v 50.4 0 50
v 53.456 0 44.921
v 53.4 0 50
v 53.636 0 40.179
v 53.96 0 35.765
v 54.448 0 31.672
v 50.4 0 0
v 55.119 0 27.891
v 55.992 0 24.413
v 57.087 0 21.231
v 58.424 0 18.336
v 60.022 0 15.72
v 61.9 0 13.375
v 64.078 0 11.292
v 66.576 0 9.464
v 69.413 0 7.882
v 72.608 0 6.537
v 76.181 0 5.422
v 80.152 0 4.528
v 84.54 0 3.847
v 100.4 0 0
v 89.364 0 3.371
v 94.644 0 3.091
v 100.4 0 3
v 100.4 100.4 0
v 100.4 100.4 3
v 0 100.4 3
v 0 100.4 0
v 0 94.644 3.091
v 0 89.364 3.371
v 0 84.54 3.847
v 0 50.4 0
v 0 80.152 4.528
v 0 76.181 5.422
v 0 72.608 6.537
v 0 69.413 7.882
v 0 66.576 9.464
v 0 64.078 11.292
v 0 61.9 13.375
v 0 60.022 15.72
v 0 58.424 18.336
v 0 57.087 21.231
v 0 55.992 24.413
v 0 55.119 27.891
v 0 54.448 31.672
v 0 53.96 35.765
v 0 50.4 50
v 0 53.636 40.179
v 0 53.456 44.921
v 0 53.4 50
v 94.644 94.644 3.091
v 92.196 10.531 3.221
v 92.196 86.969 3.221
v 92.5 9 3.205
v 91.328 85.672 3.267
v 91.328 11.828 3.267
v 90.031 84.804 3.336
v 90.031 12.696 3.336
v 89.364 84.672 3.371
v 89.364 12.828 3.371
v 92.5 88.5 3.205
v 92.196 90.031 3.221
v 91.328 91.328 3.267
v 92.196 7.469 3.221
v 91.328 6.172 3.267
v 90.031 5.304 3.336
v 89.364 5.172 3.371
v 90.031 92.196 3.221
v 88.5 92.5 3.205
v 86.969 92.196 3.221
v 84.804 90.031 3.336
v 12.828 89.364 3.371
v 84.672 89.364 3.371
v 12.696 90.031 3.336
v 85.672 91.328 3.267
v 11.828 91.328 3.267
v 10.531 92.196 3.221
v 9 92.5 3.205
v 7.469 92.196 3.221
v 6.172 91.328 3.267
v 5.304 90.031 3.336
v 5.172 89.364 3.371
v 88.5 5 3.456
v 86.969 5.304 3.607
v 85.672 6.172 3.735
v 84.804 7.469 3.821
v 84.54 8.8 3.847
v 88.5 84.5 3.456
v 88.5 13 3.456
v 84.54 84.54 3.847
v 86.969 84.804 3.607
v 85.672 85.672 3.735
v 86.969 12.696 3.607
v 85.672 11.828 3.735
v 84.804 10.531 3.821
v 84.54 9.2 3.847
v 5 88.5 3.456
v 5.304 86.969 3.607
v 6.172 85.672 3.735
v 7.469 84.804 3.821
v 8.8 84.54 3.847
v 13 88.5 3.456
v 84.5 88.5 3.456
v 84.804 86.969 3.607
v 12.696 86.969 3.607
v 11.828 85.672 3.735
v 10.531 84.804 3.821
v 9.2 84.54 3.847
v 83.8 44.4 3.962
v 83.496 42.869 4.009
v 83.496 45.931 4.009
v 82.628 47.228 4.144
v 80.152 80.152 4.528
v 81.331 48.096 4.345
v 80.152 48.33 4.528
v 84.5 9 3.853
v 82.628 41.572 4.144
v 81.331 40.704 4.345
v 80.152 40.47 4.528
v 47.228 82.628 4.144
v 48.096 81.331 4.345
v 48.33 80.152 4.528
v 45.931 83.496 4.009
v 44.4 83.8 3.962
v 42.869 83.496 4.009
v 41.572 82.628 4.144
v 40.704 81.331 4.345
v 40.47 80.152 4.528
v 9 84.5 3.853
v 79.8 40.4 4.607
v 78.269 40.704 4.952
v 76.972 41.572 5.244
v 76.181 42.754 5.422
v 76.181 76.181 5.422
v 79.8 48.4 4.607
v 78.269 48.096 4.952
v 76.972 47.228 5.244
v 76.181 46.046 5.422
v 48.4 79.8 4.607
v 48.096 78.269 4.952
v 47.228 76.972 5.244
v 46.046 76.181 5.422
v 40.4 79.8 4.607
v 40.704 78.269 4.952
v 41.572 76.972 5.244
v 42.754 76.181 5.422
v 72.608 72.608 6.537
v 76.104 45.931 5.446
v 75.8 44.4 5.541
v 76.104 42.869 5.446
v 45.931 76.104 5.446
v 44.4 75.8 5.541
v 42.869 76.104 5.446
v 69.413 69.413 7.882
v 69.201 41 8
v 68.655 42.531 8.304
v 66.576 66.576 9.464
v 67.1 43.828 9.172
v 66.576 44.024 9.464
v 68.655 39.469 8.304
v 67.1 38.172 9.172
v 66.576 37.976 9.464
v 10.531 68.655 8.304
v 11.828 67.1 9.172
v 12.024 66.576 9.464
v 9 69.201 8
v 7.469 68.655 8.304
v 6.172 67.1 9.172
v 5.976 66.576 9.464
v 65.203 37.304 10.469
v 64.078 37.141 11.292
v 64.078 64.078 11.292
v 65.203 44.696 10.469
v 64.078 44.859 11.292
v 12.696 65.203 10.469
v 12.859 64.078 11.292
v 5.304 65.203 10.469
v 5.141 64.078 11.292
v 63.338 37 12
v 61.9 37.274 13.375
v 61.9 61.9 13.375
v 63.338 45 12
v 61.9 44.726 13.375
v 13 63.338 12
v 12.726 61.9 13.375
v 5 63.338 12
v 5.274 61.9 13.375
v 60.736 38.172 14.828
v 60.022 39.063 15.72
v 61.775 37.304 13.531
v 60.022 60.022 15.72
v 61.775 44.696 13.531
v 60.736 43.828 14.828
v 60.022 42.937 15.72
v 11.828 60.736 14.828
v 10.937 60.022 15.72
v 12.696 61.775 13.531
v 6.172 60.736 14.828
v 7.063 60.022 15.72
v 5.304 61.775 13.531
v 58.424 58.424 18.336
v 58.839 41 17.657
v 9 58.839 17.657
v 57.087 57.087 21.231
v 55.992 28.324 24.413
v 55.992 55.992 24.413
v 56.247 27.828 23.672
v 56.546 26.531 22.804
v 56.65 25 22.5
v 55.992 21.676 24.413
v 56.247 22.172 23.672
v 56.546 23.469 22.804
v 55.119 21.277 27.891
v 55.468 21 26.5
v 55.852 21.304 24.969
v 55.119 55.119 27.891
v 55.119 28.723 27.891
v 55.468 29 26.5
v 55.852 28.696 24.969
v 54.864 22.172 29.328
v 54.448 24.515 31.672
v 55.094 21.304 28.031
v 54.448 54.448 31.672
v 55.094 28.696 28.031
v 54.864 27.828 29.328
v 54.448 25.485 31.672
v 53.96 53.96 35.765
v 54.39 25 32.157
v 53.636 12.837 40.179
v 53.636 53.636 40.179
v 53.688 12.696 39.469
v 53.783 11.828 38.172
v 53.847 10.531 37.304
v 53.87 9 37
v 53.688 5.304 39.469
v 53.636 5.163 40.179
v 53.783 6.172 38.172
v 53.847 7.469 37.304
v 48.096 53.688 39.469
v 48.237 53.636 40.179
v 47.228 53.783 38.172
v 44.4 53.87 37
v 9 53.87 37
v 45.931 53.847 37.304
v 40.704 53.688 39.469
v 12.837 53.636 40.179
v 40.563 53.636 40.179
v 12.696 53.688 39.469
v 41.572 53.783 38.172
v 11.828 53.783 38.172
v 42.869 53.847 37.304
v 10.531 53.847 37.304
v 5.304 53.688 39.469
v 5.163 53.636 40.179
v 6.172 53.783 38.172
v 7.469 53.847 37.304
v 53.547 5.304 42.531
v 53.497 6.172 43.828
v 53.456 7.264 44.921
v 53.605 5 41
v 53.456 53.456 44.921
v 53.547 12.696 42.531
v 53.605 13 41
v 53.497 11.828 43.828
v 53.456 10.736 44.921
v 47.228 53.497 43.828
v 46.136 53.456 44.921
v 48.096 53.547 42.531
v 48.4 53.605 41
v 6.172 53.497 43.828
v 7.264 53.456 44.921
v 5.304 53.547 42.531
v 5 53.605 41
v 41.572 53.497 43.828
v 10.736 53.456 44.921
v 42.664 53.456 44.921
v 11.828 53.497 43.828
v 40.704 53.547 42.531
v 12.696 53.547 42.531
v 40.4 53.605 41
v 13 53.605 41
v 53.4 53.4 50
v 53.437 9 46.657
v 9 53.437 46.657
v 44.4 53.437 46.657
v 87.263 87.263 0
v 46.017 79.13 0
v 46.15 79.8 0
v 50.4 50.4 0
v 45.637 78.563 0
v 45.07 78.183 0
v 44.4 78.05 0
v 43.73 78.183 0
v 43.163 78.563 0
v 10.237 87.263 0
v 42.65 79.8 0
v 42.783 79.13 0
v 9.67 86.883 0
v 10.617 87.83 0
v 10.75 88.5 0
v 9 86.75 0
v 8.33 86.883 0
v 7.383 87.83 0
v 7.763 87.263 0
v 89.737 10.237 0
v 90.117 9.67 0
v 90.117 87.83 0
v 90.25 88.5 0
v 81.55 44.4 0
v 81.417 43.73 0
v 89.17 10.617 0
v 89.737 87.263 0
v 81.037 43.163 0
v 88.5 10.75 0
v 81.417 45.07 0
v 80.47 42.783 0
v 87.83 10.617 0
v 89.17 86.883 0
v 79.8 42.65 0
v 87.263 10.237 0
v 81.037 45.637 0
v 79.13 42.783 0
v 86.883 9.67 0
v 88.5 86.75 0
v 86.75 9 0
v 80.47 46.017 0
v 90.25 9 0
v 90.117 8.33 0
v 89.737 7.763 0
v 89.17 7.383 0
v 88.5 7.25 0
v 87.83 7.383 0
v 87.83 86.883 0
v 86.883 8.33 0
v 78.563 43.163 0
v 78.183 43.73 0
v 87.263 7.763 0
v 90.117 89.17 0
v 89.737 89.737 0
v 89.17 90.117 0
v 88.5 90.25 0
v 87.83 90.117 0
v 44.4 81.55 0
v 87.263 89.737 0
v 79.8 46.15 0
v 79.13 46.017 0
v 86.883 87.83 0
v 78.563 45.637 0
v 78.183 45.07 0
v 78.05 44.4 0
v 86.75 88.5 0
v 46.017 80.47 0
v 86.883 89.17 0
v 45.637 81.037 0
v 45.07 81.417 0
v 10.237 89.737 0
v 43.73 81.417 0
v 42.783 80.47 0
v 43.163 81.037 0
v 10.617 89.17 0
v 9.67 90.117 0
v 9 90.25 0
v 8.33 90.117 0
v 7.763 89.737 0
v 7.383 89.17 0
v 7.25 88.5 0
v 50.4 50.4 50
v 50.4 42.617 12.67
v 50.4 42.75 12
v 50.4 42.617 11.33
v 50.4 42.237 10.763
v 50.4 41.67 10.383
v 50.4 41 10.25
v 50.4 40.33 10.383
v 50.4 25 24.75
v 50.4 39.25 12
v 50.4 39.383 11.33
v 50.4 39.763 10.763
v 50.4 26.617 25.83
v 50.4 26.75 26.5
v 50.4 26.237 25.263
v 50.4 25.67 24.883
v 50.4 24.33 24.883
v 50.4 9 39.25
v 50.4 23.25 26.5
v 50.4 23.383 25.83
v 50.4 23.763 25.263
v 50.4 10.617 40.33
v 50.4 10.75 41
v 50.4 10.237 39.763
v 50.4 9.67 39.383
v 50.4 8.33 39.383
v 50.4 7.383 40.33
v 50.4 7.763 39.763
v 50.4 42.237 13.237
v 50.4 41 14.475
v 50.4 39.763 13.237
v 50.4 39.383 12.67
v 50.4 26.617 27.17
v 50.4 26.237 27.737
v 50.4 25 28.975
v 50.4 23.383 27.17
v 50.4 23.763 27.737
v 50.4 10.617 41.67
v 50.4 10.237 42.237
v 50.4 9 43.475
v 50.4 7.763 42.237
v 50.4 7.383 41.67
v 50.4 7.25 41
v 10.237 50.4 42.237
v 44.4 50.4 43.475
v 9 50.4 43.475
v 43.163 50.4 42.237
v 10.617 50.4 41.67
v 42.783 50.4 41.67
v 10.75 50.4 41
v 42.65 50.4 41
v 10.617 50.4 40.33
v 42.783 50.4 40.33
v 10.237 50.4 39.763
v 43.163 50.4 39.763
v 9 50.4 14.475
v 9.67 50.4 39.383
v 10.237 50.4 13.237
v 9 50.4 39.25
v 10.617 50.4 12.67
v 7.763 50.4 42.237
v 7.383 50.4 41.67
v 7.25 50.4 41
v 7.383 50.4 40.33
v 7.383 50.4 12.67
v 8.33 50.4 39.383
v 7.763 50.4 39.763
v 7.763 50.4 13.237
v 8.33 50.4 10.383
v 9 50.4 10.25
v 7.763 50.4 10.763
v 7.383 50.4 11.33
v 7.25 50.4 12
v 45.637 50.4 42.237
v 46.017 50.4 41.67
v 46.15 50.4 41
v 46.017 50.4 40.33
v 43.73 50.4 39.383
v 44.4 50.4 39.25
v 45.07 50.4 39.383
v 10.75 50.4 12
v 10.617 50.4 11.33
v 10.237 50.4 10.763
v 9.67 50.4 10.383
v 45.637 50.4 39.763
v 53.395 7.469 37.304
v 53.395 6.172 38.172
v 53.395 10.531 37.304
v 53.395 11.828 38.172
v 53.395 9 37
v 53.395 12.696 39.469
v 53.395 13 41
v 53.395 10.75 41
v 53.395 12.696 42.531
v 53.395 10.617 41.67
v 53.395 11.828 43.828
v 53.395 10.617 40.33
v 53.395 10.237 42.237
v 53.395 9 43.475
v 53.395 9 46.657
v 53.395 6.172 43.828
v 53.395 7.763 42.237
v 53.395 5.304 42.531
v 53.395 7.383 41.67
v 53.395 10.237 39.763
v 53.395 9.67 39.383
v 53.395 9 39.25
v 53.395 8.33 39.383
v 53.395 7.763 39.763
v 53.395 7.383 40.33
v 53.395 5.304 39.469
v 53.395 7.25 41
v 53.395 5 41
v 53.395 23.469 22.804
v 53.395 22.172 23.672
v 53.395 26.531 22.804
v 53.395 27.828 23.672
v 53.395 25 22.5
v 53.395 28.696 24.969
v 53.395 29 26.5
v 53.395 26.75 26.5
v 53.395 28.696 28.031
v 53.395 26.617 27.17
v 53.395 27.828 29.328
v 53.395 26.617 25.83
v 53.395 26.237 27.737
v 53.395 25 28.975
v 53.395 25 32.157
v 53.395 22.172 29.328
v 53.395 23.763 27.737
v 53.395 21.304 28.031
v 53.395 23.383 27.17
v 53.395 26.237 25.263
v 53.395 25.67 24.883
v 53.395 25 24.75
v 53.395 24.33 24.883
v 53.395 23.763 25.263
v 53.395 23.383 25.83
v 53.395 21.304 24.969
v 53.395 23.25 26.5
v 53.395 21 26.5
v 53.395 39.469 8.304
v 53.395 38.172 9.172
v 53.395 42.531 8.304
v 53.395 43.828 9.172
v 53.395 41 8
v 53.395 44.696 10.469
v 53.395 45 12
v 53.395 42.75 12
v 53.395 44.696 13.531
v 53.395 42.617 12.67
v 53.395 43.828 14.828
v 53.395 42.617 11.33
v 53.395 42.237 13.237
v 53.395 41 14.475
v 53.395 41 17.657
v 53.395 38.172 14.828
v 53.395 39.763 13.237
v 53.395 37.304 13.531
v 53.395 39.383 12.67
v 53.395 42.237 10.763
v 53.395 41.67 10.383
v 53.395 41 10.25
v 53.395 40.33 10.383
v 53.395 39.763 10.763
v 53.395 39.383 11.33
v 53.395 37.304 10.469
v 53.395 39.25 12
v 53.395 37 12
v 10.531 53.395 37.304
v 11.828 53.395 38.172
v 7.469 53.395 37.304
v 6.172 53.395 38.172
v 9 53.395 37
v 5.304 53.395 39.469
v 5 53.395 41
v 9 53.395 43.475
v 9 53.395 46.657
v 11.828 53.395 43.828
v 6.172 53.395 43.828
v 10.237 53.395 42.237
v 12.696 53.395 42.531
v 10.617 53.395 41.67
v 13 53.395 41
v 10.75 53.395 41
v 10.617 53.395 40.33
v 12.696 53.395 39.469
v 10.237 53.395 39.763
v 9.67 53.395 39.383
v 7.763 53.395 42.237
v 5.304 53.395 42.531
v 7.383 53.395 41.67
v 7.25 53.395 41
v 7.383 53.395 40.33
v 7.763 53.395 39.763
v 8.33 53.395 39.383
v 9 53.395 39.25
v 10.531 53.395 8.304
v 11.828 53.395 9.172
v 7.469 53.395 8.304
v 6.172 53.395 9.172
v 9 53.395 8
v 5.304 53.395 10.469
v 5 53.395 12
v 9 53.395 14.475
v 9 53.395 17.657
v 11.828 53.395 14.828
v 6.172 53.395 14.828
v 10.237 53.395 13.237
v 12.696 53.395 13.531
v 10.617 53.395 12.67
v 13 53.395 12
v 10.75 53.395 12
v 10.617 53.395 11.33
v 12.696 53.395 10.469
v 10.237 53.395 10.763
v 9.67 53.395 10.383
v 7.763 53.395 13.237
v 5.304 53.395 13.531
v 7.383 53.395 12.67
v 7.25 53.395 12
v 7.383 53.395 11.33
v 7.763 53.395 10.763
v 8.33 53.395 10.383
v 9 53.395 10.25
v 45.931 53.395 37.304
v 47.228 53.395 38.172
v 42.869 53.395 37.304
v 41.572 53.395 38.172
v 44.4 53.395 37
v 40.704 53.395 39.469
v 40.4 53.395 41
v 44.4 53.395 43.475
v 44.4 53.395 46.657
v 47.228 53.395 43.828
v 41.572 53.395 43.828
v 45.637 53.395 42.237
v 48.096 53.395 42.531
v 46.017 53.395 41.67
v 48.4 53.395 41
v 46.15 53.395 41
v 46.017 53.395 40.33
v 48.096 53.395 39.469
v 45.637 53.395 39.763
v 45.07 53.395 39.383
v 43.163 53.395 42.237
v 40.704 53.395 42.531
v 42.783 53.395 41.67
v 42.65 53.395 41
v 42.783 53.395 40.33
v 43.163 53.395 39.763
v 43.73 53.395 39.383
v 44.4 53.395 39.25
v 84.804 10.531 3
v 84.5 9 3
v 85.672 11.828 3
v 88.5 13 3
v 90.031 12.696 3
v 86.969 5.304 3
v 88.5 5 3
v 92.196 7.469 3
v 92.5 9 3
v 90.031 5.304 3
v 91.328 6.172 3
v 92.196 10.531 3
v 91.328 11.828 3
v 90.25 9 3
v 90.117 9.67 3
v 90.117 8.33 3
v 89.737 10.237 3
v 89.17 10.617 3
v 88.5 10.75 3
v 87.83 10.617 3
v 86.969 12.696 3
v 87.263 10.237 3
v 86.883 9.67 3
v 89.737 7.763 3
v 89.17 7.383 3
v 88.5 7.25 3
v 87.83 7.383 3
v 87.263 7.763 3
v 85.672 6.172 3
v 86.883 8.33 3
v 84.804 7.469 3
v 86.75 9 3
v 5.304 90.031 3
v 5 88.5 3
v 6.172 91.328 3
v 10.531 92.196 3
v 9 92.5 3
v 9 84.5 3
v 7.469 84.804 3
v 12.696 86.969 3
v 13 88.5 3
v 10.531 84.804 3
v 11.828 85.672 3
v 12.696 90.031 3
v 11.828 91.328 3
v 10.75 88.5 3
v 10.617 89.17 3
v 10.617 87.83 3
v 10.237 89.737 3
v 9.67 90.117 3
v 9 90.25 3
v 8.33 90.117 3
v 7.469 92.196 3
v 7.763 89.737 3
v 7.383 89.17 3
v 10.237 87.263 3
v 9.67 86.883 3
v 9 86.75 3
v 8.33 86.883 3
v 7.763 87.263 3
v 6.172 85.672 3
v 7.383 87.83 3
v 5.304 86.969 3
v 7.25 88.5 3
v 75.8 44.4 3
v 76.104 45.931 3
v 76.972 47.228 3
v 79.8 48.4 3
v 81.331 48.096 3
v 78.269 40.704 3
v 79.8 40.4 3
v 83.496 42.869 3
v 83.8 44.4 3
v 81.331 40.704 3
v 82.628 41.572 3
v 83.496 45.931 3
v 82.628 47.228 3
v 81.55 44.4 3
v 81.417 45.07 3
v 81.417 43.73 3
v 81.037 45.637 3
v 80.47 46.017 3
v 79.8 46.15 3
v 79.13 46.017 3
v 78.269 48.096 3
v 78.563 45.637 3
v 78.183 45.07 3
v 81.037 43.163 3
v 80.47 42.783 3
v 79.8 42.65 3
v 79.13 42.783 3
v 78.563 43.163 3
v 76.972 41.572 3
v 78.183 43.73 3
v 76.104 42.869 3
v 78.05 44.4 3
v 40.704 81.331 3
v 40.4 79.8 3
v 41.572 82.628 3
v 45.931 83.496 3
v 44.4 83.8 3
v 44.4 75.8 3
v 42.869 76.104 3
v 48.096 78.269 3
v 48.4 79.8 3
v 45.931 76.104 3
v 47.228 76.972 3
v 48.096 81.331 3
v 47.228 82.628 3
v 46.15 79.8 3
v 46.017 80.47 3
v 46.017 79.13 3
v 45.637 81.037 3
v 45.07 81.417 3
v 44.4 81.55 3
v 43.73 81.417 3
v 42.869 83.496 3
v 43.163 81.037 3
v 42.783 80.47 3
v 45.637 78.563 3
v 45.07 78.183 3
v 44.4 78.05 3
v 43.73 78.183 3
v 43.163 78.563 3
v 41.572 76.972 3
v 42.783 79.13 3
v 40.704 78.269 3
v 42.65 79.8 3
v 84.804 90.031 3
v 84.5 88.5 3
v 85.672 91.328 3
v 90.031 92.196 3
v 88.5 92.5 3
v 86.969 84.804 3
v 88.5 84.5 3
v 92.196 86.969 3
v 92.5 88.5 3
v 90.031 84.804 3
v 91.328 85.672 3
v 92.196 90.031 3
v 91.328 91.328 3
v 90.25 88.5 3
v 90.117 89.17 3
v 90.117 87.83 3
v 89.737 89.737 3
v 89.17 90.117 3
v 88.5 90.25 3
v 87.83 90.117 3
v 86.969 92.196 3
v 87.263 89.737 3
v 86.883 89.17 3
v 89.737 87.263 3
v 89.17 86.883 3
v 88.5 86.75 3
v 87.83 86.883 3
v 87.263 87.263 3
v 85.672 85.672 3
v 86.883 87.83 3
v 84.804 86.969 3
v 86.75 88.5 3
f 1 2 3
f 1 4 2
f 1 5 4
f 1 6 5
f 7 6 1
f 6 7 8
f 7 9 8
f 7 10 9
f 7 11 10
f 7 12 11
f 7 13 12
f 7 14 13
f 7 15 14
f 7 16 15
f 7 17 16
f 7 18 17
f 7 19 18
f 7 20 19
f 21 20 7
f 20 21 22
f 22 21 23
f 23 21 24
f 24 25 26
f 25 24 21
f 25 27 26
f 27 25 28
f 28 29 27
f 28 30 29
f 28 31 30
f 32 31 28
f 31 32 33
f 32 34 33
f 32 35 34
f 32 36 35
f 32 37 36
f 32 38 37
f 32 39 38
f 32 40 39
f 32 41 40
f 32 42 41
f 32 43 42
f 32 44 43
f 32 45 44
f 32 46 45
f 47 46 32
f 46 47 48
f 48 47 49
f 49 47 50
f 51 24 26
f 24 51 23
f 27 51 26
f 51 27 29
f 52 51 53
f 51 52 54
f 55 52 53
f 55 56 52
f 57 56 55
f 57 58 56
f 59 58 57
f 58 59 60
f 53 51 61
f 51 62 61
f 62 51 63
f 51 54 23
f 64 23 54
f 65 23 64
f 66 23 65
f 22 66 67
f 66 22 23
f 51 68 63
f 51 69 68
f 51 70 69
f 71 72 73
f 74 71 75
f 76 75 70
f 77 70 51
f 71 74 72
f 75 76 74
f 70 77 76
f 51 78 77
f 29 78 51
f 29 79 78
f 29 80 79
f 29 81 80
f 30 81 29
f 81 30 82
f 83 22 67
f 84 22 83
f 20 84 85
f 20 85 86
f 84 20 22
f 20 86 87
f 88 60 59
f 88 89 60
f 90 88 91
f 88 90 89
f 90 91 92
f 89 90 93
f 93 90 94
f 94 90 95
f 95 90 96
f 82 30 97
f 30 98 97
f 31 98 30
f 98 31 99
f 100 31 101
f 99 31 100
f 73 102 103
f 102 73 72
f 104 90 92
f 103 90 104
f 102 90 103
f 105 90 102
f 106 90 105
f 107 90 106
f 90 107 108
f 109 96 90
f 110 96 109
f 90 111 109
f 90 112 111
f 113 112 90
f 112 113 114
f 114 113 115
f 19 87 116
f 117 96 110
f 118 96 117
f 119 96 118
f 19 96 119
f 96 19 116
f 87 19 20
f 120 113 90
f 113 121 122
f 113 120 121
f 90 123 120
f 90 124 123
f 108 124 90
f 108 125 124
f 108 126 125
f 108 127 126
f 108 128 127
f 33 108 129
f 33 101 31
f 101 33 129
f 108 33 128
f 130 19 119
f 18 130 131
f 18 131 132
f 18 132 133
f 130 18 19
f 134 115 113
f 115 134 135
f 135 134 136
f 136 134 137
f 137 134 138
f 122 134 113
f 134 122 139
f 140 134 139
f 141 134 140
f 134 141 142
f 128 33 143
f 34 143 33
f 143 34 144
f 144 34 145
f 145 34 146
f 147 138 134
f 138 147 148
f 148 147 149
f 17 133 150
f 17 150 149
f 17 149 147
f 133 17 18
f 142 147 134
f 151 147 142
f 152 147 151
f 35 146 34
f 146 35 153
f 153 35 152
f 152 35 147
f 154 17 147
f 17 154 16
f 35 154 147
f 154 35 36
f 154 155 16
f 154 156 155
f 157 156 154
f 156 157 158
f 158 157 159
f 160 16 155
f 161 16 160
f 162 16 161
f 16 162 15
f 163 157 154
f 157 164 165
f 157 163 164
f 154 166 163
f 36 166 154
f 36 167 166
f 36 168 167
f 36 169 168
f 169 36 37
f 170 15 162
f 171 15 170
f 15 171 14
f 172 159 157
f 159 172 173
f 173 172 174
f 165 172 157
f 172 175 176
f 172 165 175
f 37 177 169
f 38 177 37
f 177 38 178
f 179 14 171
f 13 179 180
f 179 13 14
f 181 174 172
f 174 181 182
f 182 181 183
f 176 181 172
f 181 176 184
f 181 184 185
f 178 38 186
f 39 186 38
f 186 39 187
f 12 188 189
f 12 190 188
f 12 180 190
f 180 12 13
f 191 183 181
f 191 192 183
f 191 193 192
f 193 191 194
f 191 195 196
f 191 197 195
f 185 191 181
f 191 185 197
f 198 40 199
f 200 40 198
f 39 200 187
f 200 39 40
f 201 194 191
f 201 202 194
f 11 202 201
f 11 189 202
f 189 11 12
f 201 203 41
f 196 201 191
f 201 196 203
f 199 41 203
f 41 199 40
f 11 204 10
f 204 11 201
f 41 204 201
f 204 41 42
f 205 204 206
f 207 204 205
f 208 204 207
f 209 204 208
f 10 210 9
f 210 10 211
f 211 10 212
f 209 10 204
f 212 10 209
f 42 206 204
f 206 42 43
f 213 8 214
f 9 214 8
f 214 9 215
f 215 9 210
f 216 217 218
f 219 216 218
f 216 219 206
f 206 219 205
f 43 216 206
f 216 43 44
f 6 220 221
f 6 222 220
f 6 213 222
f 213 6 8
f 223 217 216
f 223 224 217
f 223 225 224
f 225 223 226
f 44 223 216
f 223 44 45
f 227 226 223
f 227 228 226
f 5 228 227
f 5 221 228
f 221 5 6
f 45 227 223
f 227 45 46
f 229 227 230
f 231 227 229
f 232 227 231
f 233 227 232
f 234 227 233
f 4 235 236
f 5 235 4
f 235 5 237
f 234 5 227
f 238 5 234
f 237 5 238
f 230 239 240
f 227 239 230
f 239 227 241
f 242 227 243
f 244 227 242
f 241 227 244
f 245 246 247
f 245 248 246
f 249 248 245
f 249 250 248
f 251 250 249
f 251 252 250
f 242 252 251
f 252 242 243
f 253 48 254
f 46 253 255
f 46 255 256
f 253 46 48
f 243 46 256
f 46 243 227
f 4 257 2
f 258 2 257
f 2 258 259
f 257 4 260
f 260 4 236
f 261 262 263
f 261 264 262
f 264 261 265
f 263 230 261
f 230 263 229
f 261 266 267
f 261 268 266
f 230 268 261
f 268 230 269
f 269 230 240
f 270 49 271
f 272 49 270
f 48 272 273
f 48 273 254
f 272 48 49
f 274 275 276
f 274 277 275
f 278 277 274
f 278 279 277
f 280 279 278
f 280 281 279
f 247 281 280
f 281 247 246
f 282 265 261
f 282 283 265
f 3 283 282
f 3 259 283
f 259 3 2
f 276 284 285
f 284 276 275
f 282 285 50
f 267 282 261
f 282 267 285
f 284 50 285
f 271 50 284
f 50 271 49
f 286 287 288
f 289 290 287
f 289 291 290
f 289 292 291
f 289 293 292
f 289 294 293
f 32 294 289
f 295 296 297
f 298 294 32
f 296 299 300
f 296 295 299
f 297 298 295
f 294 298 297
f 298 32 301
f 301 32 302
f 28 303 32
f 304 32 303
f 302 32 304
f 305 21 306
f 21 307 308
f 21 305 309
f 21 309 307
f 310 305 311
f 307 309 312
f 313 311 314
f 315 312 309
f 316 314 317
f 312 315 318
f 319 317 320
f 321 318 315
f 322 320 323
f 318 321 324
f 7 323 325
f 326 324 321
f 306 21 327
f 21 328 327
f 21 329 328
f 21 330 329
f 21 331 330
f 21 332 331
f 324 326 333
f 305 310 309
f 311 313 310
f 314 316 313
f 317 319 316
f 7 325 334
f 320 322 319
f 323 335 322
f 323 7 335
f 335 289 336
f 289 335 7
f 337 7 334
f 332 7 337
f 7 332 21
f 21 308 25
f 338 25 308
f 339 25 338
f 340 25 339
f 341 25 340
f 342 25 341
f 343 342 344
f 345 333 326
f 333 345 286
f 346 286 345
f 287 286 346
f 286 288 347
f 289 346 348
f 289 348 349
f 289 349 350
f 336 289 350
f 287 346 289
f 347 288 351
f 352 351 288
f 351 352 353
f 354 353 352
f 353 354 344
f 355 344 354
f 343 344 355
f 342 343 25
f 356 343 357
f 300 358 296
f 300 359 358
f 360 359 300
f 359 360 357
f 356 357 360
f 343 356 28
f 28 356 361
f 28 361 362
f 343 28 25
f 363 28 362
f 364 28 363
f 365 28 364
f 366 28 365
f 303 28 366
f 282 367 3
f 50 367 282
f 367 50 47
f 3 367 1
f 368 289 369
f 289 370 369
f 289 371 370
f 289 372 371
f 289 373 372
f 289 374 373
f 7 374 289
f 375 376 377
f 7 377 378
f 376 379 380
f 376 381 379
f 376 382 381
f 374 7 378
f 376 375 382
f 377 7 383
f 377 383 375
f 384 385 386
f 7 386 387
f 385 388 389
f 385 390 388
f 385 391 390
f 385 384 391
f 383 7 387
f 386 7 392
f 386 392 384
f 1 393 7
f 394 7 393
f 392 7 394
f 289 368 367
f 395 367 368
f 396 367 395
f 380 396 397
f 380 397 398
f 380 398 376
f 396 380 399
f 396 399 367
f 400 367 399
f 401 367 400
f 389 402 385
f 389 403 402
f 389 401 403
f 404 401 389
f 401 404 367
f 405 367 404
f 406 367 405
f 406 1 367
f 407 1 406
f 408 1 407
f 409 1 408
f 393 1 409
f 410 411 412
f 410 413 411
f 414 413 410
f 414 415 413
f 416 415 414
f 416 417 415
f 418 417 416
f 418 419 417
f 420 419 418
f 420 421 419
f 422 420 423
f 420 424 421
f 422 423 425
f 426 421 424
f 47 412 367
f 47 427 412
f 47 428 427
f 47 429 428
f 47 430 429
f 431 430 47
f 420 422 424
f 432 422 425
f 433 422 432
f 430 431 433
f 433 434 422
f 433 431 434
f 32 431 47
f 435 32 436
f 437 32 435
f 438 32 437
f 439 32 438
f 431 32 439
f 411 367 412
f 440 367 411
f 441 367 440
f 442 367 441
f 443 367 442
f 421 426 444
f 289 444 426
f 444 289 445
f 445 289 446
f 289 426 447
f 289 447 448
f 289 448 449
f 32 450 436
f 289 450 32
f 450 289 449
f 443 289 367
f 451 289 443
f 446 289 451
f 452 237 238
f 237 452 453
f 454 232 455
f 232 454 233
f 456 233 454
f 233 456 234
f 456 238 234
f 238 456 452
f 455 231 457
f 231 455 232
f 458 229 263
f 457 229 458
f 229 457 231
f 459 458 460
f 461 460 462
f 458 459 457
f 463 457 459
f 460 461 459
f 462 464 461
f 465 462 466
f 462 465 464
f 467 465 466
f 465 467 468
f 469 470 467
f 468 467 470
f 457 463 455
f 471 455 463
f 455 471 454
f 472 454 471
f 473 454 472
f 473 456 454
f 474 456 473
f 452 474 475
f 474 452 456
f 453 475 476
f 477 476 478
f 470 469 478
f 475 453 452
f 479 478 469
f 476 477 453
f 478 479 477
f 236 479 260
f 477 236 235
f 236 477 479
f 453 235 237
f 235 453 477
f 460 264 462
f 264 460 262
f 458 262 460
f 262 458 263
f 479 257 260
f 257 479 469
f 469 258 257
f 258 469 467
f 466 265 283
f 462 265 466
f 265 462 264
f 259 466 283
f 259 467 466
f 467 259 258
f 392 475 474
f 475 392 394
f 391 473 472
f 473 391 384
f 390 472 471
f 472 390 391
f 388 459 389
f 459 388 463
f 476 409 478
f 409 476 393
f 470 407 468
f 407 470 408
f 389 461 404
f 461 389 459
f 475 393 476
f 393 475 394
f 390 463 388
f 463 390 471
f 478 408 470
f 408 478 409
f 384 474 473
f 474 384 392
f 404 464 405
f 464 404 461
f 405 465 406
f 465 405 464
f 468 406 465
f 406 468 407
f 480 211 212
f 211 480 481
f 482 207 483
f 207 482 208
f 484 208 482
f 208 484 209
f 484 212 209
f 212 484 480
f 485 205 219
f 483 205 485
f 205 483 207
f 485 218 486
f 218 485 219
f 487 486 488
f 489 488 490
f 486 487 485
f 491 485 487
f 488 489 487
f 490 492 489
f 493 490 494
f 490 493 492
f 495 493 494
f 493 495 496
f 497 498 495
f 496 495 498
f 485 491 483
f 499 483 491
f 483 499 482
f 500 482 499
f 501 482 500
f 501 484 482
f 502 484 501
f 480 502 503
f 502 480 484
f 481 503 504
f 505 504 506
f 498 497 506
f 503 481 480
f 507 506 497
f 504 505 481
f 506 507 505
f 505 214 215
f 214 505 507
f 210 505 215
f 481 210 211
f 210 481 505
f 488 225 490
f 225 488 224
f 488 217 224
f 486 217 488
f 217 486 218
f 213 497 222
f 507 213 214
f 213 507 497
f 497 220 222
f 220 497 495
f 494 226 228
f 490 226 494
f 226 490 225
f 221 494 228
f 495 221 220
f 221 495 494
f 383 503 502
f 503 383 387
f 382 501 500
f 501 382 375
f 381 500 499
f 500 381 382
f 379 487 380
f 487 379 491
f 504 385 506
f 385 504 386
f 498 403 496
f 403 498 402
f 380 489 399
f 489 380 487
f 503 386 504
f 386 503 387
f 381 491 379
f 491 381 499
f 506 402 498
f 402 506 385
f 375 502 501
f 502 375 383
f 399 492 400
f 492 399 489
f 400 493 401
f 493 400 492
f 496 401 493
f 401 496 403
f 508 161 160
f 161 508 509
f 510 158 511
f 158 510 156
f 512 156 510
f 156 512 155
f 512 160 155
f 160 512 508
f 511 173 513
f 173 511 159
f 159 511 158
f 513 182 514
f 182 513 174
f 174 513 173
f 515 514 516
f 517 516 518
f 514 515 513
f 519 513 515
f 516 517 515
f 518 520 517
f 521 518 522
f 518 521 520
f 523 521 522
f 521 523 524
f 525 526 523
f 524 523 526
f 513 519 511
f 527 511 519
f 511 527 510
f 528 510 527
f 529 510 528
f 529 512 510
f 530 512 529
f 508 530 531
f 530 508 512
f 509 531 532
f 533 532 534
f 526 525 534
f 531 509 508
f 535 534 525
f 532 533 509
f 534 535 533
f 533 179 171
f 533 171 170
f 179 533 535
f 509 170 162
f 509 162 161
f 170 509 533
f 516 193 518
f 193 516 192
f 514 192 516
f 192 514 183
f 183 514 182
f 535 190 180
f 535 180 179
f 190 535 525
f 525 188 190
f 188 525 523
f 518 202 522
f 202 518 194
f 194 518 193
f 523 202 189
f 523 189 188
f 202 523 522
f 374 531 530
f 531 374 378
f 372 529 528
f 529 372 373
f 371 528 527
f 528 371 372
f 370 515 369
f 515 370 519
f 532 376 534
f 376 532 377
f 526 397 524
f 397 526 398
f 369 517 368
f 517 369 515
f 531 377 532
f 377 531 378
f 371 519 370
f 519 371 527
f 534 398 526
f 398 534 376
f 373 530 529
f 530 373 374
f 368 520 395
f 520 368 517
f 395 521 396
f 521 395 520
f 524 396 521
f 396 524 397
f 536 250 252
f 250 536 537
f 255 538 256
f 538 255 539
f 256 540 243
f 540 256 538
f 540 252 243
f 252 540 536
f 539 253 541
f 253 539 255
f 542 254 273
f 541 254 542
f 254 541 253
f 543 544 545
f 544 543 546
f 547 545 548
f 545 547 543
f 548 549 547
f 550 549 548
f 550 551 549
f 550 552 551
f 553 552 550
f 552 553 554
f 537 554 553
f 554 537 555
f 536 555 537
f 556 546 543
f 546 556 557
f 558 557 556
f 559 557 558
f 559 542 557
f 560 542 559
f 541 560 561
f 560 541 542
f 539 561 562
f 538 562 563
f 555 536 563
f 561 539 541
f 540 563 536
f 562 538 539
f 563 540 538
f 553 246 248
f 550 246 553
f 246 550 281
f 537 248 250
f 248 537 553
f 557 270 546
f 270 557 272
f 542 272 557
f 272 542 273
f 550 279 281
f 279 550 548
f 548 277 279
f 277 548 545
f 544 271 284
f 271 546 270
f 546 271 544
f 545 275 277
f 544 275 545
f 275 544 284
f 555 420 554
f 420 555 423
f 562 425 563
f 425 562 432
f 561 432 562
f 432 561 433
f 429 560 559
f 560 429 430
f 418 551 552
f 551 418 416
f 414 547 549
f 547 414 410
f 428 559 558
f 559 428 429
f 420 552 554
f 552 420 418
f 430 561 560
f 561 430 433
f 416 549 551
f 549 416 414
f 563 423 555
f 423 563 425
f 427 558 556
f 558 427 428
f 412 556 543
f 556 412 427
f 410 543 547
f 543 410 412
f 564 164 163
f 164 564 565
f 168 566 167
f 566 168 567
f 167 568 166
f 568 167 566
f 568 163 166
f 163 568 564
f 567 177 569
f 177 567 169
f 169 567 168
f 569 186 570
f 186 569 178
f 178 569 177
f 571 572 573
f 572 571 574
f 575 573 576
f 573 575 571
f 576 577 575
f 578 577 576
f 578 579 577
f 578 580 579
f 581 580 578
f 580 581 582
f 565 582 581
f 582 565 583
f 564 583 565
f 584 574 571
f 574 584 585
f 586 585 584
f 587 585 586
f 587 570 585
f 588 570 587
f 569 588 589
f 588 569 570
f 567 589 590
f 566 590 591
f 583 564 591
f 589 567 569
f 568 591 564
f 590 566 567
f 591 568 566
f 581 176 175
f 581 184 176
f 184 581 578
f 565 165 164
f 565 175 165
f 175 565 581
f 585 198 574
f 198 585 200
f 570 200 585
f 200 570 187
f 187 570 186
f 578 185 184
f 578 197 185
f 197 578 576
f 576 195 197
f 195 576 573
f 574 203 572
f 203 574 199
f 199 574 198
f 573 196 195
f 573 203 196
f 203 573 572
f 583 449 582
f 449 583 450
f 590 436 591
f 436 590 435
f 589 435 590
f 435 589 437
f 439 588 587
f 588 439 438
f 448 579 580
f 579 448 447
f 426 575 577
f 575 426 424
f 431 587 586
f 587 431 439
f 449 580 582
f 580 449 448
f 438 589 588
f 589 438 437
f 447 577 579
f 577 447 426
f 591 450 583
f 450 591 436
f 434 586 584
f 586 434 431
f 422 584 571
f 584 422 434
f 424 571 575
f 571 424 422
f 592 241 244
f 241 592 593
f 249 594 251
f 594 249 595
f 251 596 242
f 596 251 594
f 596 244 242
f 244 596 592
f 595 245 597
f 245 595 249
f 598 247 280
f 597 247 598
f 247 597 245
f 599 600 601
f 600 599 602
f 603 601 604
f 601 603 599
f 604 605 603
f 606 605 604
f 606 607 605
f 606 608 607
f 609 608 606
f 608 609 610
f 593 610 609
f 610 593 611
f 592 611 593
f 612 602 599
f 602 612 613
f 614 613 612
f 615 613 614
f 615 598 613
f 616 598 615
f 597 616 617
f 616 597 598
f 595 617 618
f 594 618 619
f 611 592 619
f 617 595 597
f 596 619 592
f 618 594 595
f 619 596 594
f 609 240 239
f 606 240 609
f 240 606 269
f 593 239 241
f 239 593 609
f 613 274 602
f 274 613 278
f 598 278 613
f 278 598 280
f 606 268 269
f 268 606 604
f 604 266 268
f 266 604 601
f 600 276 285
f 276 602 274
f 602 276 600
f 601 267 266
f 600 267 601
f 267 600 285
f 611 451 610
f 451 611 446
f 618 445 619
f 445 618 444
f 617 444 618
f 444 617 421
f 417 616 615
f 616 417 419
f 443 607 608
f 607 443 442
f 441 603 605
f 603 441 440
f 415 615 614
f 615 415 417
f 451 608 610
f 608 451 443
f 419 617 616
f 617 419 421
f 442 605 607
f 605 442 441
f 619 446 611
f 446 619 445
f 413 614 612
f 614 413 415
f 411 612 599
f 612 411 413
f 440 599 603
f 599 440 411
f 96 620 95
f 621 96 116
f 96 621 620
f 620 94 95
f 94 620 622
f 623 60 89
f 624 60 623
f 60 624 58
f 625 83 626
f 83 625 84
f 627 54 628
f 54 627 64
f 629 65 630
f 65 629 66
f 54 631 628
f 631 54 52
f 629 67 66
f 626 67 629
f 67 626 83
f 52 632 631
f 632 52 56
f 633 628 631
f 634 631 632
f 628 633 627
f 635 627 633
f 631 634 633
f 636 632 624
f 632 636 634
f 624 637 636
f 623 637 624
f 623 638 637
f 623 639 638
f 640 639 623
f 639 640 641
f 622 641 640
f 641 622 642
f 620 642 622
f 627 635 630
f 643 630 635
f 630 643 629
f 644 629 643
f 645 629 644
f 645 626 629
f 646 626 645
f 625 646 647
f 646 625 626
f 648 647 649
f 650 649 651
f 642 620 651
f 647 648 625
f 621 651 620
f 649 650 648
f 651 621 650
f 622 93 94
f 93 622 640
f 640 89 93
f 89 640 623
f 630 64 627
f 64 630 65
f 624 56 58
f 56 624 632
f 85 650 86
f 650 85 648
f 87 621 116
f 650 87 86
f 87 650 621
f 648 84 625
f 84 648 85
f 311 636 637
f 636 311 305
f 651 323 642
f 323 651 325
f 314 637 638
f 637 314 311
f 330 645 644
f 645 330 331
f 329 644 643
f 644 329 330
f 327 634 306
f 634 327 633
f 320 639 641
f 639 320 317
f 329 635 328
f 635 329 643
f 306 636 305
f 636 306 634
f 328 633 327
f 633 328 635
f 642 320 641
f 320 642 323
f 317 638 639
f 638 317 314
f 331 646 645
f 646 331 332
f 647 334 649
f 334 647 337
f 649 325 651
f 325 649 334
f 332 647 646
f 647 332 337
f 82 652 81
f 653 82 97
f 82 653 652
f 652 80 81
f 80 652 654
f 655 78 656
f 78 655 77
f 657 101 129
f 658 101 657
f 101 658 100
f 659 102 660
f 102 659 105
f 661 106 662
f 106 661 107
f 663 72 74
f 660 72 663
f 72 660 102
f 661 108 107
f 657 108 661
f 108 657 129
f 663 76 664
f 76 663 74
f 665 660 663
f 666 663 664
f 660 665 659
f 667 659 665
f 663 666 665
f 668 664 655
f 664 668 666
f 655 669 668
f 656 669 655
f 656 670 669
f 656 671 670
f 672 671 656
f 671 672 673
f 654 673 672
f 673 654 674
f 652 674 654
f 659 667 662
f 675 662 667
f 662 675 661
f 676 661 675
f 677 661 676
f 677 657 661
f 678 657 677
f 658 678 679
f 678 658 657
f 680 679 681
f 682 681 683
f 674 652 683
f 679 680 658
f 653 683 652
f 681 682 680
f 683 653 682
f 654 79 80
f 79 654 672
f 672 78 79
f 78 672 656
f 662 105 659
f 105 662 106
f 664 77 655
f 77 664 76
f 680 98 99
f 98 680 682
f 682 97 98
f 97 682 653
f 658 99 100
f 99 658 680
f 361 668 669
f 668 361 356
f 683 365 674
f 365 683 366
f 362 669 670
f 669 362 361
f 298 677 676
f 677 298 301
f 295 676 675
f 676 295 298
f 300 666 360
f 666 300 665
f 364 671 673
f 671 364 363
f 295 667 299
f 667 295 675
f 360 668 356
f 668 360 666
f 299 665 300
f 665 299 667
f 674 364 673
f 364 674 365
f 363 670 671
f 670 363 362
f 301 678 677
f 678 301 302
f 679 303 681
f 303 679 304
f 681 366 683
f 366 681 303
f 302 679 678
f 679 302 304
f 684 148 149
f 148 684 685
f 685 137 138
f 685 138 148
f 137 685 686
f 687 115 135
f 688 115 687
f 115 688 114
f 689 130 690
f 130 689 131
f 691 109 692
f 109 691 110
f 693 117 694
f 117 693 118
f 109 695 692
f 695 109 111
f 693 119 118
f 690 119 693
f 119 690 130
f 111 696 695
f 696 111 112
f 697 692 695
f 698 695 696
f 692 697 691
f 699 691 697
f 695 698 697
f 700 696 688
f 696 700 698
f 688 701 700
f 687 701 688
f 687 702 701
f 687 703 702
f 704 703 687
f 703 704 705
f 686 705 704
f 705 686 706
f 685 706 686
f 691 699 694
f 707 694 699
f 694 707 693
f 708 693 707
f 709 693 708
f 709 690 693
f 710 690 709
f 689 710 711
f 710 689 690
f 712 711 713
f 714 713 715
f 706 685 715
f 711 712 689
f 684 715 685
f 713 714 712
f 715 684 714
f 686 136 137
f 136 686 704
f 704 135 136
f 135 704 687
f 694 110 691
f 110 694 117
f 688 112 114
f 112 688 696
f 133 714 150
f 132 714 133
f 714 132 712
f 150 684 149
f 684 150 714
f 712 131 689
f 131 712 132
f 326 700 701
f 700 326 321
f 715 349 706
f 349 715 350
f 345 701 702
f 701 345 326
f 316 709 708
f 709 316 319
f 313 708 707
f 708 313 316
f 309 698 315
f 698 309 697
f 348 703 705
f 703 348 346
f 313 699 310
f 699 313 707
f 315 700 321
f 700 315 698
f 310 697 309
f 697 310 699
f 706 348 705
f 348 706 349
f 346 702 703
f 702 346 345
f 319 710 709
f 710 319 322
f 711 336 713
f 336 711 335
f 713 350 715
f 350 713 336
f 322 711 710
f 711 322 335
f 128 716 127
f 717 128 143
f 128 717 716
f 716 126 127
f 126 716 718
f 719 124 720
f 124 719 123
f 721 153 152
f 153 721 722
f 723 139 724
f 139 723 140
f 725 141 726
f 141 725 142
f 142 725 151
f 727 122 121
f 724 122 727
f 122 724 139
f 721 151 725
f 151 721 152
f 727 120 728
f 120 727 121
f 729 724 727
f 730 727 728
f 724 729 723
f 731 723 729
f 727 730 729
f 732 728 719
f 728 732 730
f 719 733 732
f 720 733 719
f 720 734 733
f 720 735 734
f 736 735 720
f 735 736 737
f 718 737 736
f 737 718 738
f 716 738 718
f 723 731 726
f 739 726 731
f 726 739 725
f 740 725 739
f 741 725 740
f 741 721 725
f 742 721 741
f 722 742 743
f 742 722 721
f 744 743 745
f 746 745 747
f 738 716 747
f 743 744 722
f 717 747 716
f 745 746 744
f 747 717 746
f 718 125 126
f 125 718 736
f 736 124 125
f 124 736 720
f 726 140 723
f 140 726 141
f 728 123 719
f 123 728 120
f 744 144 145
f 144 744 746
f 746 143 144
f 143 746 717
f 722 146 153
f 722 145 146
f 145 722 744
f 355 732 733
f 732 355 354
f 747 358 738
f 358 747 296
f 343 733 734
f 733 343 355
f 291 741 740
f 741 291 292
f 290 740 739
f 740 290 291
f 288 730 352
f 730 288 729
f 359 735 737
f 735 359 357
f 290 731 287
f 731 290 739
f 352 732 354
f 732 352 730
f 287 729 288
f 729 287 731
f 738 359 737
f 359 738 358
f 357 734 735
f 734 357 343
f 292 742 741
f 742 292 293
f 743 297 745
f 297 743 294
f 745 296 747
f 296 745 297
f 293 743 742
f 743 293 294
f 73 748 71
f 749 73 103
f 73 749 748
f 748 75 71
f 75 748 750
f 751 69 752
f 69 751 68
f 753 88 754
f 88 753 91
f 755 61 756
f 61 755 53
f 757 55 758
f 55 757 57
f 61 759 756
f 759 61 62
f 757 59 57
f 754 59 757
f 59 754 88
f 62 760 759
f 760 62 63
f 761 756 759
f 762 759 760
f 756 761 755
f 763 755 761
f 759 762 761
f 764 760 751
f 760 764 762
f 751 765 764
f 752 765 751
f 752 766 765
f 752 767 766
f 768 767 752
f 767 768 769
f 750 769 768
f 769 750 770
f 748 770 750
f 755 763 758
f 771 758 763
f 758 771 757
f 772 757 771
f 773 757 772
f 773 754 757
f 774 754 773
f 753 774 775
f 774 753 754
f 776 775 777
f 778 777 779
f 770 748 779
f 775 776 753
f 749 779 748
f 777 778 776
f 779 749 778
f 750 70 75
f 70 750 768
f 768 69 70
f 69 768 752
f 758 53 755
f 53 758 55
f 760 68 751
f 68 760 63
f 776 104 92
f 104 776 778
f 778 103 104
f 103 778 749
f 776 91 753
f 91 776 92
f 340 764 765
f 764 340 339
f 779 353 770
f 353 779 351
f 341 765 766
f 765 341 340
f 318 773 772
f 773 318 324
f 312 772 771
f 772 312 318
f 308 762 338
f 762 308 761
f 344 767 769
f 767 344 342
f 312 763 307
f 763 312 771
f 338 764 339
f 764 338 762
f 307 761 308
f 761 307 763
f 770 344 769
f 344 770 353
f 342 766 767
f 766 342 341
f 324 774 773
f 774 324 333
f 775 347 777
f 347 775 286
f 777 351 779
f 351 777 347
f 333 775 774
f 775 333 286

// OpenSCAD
use <bezier.scad>;
use <tubemesh.scad>;

postSize = 50.4;
supportHeight = 50;
supportWidth = 50;
thicknessAtBottom = 3;
thicknessAtTop = 3;
topVerticalityControl = 0.7;
bottomHorizontalityControl = 0.8;
precision = 0.05;
countersinkDiameter = 8;
screwHoleDiameter = 3.5;
screwHoleLength = 3;
teardropHoles = true;
minimumHoleDistanceFromEdge = 5;
xFaceHolePositions = 
    [ [0,1], [0.5,0.5], [1,0] ];
yFaceHolePositions = 
    [ [1,1], [1,0], [0,1] ];
zFaceHolePositions = 
    [ [0,0.1], [0.5,0.4], [1,0.1] ];

module dummy() {}

nudge = 0.005;

curve = Bezier([ 
    [supportWidth,0],
    SHARP(),
    SHARP(),
    [supportWidth,thicknessAtBottom],
    OFFSET([-bottomHorizontalityControl * supportWidth,0]),
    OFFSET([0,-topVerticalityControl*supportHeight]),
    [thicknessAtTop,supportHeight] ], precision=precision); 

sections = [for(p=curve) let(d=p[0]+postSize)
     [ [0,0,p[1]], [d,0,p[1]], [d,d,p[1]], [0,d,p[1] ] ]
     ];

module support() {
    render(convexity=2)
    difference() {
        tubeMesh(sections);
        translate([0,0,-nudge]) cube([postSize,postSize,supportHeight+2*nudge]);
    }
}

module horizontalHole(diameter=10,length=50,teardrop=true) {
    rotate([0,90,0]) {
        cylinder(d=diameter, h=length);
        if (teardrop)
        translate([-diameter/(2*sqrt(2)),0,0]) cylinder(d=diameter/sqrt(2), h=length, $fn=4);
    }
}

module horizontalScrewHole(teardrop=teardropHoles) {
    $fn = 16;
    translate([screwHoleLength,0,0])
    horizontalHole(diameter=countersinkDiameter, length=supportWidth+2*nudge, teardrop=teardrop);
    translate([-nudge,0,0])
    horizontalHole(diameter=screwHoleDiameter, length = screwHoleLength + 2*nudge, teardrop=teardrop);
}
module verticalScrewHole() {
    rotate([0,-90,0])
    horizontalScrewHole(teardrop=false);
}

holeOffset =  minimumHoleDistanceFromEdge + countersinkDiameter / 2;

module xFaceScrewHoles() {
    y0 = holeOffset;
    z0 = thicknessAtBottom + holeOffset;
    y1 = supportWidth - holeOffset;
    z1 = supportHeight - holeOffset;
    for(pos=xFaceHolePositions) {
        y = (1-pos[0])*y0 + (pos[0])*y1;
        z = (1-pos[1])*z0 + (pos[1])*z1;
        translate([postSize-nudge,y,z]) horizontalScrewHole();
    }
}

module yFaceScrewHoles() {
    x0 = postSize + thicknessAtTop - holeOffset;
    z0 = thicknessAtBottom + holeOffset;
    x1 = holeOffset;
    z1 = supportHeight - holeOffset;
    for(pos=yFaceHolePositions) {
        x = (1-pos[0])*x0 + (pos[0])*x1;
        z = (1-pos[1])*z0 + (pos[1])*z1;
        translate([x,postSize-nudge,z])
        rotate([0,0,90]) horizontalScrewHole();
    }
}

module zFaceScrewHoles() {
    x0 = postSize + supportWidth - holeOffset;
    x1 = postSize + thicknessAtTop + holeOffset;
    y0 = holeOffset;
    
    for(pos=zFaceHolePositions) {
        x = (1-pos[1])*x0 + pos[1]*x1;
        y1 = x;
        y = (1-pos[0])*y0 + (pos[0])*y1;
        translate([x,y,0]) verticalScrewHole();
        translate([y,x,0]) verticalScrewHole();
    }
}

render(convexity=5)
difference() {
    support();
    xFaceScrewHoles();
    yFaceScrewHoles();
    zFaceScrewHoles();
}
